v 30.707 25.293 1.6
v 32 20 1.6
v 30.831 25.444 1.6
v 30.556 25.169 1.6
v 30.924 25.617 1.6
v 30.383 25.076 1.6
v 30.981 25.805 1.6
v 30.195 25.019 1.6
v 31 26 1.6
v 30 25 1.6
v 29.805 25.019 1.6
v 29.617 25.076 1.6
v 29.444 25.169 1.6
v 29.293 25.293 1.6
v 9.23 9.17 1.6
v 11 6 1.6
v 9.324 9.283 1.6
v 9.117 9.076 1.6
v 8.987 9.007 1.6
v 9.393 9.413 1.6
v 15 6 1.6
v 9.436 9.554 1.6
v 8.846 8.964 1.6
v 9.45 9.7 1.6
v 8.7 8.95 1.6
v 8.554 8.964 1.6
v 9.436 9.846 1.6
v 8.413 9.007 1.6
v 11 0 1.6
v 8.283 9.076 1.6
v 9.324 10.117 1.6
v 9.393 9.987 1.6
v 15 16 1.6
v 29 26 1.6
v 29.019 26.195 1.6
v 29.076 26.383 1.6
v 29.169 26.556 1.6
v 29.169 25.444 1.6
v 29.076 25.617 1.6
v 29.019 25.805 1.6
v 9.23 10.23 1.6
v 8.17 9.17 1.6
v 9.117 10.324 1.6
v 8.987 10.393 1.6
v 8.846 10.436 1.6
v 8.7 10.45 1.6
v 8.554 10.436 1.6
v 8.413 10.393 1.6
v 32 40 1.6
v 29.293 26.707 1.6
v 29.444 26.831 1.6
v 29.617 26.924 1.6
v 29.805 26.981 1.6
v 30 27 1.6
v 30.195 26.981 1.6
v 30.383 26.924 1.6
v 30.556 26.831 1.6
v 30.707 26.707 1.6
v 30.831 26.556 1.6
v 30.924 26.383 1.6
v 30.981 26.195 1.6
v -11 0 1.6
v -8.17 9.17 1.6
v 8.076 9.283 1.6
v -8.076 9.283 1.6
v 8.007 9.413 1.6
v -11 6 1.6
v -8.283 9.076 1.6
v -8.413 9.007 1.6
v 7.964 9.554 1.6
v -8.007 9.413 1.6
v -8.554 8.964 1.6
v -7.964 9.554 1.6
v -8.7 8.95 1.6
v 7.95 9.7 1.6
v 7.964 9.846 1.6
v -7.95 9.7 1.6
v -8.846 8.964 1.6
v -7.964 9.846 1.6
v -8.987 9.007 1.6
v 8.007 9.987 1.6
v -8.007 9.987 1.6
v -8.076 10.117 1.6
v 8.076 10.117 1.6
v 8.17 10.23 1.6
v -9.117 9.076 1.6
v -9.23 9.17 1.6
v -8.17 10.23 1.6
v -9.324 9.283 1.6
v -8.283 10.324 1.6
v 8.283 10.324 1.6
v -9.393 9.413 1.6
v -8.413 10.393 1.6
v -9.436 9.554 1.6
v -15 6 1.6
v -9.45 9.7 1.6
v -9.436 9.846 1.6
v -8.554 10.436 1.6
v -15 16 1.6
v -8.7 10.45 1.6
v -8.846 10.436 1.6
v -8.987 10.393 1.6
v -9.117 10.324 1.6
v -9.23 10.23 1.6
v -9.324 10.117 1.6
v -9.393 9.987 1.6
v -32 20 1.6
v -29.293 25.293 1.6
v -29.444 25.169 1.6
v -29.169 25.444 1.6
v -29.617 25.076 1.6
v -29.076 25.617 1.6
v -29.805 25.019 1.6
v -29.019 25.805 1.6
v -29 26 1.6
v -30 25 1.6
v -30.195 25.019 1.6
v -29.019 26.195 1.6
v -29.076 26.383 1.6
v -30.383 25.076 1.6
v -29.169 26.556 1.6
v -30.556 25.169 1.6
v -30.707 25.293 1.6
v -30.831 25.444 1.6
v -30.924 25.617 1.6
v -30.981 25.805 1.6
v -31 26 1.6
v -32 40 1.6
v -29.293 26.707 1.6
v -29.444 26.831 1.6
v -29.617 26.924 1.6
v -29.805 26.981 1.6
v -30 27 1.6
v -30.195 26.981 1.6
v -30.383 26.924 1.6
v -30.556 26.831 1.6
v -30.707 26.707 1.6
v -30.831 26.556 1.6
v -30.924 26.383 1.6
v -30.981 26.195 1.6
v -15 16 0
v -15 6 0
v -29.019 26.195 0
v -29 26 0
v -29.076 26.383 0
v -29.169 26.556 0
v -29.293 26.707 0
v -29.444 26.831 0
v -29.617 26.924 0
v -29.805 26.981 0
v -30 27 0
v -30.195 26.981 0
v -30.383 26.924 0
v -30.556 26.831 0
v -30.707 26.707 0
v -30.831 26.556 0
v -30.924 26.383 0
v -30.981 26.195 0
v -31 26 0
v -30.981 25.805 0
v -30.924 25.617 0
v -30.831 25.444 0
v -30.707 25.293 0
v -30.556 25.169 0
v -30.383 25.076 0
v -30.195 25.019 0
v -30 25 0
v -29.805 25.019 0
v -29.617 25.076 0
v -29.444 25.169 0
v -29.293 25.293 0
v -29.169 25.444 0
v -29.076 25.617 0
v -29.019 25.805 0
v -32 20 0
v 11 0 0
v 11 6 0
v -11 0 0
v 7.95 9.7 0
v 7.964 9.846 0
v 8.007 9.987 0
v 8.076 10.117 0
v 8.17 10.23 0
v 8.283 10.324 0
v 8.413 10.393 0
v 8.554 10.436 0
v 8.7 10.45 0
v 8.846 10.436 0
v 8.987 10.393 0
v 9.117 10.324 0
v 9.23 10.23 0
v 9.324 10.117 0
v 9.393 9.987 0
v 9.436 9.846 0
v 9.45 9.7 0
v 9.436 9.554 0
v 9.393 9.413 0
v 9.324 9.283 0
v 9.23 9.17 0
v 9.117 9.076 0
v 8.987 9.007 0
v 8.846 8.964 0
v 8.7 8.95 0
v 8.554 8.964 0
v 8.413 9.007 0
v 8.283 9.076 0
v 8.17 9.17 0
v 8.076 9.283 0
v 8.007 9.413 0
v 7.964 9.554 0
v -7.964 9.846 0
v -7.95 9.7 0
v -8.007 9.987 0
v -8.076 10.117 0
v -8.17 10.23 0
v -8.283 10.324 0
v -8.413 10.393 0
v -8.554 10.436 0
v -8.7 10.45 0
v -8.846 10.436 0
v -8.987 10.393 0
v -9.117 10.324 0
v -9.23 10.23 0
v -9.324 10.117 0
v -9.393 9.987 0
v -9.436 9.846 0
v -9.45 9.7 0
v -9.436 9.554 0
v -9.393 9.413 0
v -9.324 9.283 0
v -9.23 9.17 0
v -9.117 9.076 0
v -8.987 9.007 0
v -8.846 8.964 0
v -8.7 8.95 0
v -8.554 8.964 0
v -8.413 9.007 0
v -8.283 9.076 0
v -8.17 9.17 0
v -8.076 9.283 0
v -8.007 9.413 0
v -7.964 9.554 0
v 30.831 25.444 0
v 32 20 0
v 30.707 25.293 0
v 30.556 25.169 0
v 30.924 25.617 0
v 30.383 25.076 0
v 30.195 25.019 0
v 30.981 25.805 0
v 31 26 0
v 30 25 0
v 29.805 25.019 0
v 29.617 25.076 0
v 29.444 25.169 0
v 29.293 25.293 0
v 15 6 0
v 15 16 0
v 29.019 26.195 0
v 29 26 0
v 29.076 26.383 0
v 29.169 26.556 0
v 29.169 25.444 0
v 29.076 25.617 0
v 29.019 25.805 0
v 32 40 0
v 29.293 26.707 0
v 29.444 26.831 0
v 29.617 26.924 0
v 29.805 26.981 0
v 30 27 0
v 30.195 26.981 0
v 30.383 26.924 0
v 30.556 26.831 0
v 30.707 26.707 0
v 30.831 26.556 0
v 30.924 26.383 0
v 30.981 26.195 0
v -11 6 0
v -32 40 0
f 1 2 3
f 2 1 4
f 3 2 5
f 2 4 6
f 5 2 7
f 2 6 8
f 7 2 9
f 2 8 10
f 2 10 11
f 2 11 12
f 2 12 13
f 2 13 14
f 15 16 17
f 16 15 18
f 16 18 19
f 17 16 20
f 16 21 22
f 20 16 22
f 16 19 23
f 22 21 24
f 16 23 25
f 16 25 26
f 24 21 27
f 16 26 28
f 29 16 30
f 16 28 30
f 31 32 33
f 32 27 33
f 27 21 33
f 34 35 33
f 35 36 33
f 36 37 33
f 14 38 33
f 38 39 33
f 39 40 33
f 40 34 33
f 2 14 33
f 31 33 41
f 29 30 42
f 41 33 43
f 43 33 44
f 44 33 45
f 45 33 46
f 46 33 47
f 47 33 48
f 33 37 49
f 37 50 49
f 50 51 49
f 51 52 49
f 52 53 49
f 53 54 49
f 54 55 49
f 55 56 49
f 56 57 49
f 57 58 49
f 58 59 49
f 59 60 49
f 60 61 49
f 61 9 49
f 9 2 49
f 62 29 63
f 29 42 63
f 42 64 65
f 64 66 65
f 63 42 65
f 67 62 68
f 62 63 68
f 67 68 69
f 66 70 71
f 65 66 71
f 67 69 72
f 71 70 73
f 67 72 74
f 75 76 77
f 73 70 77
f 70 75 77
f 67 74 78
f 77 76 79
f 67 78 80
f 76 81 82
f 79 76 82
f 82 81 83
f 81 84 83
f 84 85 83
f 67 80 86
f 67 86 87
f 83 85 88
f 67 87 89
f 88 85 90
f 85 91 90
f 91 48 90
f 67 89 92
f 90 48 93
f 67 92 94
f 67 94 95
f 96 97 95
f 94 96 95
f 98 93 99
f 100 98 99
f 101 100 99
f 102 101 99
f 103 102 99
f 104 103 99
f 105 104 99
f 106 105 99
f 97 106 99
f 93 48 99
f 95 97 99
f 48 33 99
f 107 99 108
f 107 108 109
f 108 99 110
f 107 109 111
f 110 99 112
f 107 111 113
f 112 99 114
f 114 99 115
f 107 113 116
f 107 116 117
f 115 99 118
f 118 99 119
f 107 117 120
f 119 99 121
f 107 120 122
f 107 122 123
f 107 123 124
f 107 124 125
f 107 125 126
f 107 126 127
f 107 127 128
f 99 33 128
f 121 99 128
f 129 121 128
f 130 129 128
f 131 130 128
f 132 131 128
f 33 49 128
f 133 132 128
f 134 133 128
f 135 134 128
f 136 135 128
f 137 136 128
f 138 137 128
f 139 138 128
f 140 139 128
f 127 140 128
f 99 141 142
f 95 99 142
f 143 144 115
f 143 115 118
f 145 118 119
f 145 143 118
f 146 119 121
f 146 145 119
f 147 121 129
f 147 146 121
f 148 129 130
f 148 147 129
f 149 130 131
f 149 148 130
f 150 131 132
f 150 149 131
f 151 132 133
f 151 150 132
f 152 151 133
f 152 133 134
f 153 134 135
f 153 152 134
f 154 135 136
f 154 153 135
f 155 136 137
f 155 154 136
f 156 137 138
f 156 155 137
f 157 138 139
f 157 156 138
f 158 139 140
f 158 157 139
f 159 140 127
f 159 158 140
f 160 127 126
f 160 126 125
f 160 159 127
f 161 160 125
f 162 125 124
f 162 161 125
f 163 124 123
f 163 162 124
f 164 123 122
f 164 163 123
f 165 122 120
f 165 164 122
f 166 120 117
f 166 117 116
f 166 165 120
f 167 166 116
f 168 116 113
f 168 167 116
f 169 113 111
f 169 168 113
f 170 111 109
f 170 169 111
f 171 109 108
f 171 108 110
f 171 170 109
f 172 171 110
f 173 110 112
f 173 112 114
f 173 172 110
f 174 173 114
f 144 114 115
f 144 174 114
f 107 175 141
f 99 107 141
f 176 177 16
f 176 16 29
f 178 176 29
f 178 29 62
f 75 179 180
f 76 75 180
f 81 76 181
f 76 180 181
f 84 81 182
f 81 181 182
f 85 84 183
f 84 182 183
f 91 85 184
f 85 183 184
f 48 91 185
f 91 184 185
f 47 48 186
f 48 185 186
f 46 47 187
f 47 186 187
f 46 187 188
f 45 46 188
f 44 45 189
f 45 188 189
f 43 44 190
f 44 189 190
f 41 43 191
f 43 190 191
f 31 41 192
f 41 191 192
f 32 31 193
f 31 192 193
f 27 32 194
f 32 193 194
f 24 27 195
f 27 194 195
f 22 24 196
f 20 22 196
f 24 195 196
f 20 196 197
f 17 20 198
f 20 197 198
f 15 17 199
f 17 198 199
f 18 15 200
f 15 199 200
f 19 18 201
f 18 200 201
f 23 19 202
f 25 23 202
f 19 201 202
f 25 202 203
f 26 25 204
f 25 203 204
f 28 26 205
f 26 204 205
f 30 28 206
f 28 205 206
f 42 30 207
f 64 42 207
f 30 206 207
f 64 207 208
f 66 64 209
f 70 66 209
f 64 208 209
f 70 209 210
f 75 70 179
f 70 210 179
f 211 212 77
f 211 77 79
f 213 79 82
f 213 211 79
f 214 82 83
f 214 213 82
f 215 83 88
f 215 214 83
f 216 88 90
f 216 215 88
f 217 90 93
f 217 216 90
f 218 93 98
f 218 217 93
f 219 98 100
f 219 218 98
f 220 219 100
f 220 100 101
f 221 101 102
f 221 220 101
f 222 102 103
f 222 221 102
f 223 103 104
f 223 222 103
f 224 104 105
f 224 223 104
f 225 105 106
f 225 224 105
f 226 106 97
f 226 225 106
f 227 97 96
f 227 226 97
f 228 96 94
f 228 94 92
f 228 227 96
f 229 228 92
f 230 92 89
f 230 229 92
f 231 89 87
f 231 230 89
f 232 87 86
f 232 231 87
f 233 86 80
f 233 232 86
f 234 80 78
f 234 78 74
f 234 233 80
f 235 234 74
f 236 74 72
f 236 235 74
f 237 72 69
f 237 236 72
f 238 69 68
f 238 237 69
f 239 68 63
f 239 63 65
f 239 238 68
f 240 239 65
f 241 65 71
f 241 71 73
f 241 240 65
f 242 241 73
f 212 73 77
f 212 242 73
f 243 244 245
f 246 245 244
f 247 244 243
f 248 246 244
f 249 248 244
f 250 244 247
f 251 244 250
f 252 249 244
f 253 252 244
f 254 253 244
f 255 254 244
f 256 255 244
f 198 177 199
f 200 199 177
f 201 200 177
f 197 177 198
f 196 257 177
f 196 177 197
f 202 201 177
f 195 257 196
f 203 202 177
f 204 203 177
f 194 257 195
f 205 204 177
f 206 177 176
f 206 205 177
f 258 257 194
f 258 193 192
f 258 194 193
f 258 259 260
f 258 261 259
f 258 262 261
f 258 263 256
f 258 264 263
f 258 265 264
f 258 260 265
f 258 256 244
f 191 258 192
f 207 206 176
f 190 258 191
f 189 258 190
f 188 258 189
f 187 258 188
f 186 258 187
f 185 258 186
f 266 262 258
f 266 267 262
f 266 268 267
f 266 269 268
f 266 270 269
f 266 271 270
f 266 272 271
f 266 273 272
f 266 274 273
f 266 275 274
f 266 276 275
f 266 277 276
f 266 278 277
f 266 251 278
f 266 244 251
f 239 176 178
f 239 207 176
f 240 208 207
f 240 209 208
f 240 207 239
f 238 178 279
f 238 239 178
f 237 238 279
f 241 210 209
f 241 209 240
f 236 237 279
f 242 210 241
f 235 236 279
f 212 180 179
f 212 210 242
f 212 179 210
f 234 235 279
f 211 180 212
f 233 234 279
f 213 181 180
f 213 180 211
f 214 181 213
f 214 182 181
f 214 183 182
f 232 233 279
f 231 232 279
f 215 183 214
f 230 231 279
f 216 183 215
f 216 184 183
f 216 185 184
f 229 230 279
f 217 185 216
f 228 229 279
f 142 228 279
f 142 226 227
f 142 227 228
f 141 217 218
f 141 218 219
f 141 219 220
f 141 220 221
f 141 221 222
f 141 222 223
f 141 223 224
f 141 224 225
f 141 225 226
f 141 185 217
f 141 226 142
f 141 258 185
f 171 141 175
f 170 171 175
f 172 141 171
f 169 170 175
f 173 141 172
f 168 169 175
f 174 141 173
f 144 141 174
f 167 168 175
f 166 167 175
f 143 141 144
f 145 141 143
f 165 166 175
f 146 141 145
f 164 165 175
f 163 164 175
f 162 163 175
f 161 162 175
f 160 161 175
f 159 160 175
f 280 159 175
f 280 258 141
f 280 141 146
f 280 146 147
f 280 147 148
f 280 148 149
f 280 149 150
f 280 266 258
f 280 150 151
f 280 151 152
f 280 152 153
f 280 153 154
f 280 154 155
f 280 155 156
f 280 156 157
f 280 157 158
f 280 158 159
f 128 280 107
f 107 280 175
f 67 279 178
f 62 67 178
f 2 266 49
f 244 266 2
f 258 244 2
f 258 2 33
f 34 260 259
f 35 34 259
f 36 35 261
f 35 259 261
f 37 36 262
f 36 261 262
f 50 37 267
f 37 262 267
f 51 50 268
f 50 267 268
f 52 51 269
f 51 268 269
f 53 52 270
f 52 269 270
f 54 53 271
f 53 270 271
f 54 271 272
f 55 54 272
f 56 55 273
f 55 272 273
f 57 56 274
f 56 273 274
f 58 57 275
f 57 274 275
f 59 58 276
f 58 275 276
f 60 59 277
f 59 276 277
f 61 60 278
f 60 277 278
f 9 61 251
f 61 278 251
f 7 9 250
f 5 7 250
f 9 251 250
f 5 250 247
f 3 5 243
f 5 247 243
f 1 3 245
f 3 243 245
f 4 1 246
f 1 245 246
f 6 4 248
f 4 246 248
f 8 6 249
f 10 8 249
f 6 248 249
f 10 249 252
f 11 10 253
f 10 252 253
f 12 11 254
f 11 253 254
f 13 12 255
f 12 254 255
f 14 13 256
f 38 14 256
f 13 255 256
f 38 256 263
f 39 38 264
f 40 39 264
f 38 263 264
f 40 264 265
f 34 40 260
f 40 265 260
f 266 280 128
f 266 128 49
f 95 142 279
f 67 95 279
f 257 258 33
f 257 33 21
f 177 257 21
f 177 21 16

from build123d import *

# Parameters (mm, degrees)
SKETCH4_R           = 1
SKETCH4_R_2         = 0.75
BOSS_EXTRUDE1_DEPTH = 1.6


with BuildPart() as part:
    # Sketch4 → Boss-Extrude1 (new body)
    with BuildSketch(Plane.XY):
        Polygon((0, 40), (-32, 40), (-32, 20), (-15, 16), (-15, 6), (-11, 6), (-11, 0), (0, 0), align=None)
        with Locations((-30, 26)):
            Circle(SKETCH4_R, mode=Mode.SUBTRACT)
        with Locations((-8.7, 9.7)):
            Circle(SKETCH4_R_2, mode=Mode.SUBTRACT)
    boss_extrude1 = extrude(amount=BOSS_EXTRUDE1_DEPTH)

    # Mirror1: Boss-Extrude1 across plane
    add(boss_extrude1.mirror(Plane(origin=(0, 0, 1.6), x_dir=(0, 0, 1), z_dir=(-1, 0, 0))))


solid = part.part
